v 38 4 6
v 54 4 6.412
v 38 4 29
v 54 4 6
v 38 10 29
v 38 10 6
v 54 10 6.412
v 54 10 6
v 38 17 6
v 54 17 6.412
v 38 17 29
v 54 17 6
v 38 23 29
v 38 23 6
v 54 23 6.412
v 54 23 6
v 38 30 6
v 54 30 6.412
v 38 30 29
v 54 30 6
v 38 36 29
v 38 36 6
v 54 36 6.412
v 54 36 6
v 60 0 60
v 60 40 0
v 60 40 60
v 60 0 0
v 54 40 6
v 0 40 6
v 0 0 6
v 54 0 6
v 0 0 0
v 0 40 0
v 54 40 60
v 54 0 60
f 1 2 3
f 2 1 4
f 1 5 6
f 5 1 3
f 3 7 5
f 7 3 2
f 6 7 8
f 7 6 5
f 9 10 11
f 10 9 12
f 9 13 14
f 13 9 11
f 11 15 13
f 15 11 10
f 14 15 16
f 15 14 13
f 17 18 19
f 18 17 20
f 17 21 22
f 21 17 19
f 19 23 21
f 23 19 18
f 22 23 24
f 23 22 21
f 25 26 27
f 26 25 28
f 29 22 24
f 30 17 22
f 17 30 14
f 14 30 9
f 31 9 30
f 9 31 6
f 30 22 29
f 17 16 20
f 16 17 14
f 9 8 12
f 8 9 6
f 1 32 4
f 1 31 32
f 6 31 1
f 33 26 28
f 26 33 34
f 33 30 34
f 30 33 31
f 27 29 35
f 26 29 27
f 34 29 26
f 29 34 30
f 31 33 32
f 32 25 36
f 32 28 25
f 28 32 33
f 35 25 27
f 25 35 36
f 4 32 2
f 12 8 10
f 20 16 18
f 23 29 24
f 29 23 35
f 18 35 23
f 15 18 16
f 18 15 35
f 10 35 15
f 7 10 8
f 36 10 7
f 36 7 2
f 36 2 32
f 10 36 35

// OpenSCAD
$fn = 32;

// ----------------------------------------------------------------------
// Rib bracket: 3-gusset L bracket
// ----------------------------------------------------------------------

// --- parameters (mm) ---
base_l = 60;              // foot length, X
base_w = 40;              // foot width, Y
base_t = 6;               // foot thickness
plate_t = 6;              // upright plate thickness
plate_h = 60;             // overall height
gus_l = 16;               // gusset leg along the foot
gus_h = 24;               // gusset height
gus_t = 6;                // gusset thickness
gus_edge = 4;             // gusset margin from the foot edge
n_gus = 3;                // gusset count
fit_tol = 0.1;            // tolerance for press fits, mm
free_tol = 0.5;           // tolerance for clearance fits, mm

gus_pitch = (base_w - 2 * gus_edge - gus_t) / (n_gus - 1);  // gusset pitch

union() {
  cube([base_l, base_w, base_t]);
  translate([base_l - plate_t, 0, base_t - 1])
    cube([plate_t, base_w, plate_h - base_t + 1]);
  for (i = [0 : n_gus - 1])
    translate([base_l - plate_t - gus_l, gus_edge + i * gus_pitch, base_t - 1])
      rotate([-90, 0, 0])
        linear_extrude(height = gus_t)
          polygon(points = [[0, 0], [gus_l + 1, 0], [0, -gus_h]]);
}
